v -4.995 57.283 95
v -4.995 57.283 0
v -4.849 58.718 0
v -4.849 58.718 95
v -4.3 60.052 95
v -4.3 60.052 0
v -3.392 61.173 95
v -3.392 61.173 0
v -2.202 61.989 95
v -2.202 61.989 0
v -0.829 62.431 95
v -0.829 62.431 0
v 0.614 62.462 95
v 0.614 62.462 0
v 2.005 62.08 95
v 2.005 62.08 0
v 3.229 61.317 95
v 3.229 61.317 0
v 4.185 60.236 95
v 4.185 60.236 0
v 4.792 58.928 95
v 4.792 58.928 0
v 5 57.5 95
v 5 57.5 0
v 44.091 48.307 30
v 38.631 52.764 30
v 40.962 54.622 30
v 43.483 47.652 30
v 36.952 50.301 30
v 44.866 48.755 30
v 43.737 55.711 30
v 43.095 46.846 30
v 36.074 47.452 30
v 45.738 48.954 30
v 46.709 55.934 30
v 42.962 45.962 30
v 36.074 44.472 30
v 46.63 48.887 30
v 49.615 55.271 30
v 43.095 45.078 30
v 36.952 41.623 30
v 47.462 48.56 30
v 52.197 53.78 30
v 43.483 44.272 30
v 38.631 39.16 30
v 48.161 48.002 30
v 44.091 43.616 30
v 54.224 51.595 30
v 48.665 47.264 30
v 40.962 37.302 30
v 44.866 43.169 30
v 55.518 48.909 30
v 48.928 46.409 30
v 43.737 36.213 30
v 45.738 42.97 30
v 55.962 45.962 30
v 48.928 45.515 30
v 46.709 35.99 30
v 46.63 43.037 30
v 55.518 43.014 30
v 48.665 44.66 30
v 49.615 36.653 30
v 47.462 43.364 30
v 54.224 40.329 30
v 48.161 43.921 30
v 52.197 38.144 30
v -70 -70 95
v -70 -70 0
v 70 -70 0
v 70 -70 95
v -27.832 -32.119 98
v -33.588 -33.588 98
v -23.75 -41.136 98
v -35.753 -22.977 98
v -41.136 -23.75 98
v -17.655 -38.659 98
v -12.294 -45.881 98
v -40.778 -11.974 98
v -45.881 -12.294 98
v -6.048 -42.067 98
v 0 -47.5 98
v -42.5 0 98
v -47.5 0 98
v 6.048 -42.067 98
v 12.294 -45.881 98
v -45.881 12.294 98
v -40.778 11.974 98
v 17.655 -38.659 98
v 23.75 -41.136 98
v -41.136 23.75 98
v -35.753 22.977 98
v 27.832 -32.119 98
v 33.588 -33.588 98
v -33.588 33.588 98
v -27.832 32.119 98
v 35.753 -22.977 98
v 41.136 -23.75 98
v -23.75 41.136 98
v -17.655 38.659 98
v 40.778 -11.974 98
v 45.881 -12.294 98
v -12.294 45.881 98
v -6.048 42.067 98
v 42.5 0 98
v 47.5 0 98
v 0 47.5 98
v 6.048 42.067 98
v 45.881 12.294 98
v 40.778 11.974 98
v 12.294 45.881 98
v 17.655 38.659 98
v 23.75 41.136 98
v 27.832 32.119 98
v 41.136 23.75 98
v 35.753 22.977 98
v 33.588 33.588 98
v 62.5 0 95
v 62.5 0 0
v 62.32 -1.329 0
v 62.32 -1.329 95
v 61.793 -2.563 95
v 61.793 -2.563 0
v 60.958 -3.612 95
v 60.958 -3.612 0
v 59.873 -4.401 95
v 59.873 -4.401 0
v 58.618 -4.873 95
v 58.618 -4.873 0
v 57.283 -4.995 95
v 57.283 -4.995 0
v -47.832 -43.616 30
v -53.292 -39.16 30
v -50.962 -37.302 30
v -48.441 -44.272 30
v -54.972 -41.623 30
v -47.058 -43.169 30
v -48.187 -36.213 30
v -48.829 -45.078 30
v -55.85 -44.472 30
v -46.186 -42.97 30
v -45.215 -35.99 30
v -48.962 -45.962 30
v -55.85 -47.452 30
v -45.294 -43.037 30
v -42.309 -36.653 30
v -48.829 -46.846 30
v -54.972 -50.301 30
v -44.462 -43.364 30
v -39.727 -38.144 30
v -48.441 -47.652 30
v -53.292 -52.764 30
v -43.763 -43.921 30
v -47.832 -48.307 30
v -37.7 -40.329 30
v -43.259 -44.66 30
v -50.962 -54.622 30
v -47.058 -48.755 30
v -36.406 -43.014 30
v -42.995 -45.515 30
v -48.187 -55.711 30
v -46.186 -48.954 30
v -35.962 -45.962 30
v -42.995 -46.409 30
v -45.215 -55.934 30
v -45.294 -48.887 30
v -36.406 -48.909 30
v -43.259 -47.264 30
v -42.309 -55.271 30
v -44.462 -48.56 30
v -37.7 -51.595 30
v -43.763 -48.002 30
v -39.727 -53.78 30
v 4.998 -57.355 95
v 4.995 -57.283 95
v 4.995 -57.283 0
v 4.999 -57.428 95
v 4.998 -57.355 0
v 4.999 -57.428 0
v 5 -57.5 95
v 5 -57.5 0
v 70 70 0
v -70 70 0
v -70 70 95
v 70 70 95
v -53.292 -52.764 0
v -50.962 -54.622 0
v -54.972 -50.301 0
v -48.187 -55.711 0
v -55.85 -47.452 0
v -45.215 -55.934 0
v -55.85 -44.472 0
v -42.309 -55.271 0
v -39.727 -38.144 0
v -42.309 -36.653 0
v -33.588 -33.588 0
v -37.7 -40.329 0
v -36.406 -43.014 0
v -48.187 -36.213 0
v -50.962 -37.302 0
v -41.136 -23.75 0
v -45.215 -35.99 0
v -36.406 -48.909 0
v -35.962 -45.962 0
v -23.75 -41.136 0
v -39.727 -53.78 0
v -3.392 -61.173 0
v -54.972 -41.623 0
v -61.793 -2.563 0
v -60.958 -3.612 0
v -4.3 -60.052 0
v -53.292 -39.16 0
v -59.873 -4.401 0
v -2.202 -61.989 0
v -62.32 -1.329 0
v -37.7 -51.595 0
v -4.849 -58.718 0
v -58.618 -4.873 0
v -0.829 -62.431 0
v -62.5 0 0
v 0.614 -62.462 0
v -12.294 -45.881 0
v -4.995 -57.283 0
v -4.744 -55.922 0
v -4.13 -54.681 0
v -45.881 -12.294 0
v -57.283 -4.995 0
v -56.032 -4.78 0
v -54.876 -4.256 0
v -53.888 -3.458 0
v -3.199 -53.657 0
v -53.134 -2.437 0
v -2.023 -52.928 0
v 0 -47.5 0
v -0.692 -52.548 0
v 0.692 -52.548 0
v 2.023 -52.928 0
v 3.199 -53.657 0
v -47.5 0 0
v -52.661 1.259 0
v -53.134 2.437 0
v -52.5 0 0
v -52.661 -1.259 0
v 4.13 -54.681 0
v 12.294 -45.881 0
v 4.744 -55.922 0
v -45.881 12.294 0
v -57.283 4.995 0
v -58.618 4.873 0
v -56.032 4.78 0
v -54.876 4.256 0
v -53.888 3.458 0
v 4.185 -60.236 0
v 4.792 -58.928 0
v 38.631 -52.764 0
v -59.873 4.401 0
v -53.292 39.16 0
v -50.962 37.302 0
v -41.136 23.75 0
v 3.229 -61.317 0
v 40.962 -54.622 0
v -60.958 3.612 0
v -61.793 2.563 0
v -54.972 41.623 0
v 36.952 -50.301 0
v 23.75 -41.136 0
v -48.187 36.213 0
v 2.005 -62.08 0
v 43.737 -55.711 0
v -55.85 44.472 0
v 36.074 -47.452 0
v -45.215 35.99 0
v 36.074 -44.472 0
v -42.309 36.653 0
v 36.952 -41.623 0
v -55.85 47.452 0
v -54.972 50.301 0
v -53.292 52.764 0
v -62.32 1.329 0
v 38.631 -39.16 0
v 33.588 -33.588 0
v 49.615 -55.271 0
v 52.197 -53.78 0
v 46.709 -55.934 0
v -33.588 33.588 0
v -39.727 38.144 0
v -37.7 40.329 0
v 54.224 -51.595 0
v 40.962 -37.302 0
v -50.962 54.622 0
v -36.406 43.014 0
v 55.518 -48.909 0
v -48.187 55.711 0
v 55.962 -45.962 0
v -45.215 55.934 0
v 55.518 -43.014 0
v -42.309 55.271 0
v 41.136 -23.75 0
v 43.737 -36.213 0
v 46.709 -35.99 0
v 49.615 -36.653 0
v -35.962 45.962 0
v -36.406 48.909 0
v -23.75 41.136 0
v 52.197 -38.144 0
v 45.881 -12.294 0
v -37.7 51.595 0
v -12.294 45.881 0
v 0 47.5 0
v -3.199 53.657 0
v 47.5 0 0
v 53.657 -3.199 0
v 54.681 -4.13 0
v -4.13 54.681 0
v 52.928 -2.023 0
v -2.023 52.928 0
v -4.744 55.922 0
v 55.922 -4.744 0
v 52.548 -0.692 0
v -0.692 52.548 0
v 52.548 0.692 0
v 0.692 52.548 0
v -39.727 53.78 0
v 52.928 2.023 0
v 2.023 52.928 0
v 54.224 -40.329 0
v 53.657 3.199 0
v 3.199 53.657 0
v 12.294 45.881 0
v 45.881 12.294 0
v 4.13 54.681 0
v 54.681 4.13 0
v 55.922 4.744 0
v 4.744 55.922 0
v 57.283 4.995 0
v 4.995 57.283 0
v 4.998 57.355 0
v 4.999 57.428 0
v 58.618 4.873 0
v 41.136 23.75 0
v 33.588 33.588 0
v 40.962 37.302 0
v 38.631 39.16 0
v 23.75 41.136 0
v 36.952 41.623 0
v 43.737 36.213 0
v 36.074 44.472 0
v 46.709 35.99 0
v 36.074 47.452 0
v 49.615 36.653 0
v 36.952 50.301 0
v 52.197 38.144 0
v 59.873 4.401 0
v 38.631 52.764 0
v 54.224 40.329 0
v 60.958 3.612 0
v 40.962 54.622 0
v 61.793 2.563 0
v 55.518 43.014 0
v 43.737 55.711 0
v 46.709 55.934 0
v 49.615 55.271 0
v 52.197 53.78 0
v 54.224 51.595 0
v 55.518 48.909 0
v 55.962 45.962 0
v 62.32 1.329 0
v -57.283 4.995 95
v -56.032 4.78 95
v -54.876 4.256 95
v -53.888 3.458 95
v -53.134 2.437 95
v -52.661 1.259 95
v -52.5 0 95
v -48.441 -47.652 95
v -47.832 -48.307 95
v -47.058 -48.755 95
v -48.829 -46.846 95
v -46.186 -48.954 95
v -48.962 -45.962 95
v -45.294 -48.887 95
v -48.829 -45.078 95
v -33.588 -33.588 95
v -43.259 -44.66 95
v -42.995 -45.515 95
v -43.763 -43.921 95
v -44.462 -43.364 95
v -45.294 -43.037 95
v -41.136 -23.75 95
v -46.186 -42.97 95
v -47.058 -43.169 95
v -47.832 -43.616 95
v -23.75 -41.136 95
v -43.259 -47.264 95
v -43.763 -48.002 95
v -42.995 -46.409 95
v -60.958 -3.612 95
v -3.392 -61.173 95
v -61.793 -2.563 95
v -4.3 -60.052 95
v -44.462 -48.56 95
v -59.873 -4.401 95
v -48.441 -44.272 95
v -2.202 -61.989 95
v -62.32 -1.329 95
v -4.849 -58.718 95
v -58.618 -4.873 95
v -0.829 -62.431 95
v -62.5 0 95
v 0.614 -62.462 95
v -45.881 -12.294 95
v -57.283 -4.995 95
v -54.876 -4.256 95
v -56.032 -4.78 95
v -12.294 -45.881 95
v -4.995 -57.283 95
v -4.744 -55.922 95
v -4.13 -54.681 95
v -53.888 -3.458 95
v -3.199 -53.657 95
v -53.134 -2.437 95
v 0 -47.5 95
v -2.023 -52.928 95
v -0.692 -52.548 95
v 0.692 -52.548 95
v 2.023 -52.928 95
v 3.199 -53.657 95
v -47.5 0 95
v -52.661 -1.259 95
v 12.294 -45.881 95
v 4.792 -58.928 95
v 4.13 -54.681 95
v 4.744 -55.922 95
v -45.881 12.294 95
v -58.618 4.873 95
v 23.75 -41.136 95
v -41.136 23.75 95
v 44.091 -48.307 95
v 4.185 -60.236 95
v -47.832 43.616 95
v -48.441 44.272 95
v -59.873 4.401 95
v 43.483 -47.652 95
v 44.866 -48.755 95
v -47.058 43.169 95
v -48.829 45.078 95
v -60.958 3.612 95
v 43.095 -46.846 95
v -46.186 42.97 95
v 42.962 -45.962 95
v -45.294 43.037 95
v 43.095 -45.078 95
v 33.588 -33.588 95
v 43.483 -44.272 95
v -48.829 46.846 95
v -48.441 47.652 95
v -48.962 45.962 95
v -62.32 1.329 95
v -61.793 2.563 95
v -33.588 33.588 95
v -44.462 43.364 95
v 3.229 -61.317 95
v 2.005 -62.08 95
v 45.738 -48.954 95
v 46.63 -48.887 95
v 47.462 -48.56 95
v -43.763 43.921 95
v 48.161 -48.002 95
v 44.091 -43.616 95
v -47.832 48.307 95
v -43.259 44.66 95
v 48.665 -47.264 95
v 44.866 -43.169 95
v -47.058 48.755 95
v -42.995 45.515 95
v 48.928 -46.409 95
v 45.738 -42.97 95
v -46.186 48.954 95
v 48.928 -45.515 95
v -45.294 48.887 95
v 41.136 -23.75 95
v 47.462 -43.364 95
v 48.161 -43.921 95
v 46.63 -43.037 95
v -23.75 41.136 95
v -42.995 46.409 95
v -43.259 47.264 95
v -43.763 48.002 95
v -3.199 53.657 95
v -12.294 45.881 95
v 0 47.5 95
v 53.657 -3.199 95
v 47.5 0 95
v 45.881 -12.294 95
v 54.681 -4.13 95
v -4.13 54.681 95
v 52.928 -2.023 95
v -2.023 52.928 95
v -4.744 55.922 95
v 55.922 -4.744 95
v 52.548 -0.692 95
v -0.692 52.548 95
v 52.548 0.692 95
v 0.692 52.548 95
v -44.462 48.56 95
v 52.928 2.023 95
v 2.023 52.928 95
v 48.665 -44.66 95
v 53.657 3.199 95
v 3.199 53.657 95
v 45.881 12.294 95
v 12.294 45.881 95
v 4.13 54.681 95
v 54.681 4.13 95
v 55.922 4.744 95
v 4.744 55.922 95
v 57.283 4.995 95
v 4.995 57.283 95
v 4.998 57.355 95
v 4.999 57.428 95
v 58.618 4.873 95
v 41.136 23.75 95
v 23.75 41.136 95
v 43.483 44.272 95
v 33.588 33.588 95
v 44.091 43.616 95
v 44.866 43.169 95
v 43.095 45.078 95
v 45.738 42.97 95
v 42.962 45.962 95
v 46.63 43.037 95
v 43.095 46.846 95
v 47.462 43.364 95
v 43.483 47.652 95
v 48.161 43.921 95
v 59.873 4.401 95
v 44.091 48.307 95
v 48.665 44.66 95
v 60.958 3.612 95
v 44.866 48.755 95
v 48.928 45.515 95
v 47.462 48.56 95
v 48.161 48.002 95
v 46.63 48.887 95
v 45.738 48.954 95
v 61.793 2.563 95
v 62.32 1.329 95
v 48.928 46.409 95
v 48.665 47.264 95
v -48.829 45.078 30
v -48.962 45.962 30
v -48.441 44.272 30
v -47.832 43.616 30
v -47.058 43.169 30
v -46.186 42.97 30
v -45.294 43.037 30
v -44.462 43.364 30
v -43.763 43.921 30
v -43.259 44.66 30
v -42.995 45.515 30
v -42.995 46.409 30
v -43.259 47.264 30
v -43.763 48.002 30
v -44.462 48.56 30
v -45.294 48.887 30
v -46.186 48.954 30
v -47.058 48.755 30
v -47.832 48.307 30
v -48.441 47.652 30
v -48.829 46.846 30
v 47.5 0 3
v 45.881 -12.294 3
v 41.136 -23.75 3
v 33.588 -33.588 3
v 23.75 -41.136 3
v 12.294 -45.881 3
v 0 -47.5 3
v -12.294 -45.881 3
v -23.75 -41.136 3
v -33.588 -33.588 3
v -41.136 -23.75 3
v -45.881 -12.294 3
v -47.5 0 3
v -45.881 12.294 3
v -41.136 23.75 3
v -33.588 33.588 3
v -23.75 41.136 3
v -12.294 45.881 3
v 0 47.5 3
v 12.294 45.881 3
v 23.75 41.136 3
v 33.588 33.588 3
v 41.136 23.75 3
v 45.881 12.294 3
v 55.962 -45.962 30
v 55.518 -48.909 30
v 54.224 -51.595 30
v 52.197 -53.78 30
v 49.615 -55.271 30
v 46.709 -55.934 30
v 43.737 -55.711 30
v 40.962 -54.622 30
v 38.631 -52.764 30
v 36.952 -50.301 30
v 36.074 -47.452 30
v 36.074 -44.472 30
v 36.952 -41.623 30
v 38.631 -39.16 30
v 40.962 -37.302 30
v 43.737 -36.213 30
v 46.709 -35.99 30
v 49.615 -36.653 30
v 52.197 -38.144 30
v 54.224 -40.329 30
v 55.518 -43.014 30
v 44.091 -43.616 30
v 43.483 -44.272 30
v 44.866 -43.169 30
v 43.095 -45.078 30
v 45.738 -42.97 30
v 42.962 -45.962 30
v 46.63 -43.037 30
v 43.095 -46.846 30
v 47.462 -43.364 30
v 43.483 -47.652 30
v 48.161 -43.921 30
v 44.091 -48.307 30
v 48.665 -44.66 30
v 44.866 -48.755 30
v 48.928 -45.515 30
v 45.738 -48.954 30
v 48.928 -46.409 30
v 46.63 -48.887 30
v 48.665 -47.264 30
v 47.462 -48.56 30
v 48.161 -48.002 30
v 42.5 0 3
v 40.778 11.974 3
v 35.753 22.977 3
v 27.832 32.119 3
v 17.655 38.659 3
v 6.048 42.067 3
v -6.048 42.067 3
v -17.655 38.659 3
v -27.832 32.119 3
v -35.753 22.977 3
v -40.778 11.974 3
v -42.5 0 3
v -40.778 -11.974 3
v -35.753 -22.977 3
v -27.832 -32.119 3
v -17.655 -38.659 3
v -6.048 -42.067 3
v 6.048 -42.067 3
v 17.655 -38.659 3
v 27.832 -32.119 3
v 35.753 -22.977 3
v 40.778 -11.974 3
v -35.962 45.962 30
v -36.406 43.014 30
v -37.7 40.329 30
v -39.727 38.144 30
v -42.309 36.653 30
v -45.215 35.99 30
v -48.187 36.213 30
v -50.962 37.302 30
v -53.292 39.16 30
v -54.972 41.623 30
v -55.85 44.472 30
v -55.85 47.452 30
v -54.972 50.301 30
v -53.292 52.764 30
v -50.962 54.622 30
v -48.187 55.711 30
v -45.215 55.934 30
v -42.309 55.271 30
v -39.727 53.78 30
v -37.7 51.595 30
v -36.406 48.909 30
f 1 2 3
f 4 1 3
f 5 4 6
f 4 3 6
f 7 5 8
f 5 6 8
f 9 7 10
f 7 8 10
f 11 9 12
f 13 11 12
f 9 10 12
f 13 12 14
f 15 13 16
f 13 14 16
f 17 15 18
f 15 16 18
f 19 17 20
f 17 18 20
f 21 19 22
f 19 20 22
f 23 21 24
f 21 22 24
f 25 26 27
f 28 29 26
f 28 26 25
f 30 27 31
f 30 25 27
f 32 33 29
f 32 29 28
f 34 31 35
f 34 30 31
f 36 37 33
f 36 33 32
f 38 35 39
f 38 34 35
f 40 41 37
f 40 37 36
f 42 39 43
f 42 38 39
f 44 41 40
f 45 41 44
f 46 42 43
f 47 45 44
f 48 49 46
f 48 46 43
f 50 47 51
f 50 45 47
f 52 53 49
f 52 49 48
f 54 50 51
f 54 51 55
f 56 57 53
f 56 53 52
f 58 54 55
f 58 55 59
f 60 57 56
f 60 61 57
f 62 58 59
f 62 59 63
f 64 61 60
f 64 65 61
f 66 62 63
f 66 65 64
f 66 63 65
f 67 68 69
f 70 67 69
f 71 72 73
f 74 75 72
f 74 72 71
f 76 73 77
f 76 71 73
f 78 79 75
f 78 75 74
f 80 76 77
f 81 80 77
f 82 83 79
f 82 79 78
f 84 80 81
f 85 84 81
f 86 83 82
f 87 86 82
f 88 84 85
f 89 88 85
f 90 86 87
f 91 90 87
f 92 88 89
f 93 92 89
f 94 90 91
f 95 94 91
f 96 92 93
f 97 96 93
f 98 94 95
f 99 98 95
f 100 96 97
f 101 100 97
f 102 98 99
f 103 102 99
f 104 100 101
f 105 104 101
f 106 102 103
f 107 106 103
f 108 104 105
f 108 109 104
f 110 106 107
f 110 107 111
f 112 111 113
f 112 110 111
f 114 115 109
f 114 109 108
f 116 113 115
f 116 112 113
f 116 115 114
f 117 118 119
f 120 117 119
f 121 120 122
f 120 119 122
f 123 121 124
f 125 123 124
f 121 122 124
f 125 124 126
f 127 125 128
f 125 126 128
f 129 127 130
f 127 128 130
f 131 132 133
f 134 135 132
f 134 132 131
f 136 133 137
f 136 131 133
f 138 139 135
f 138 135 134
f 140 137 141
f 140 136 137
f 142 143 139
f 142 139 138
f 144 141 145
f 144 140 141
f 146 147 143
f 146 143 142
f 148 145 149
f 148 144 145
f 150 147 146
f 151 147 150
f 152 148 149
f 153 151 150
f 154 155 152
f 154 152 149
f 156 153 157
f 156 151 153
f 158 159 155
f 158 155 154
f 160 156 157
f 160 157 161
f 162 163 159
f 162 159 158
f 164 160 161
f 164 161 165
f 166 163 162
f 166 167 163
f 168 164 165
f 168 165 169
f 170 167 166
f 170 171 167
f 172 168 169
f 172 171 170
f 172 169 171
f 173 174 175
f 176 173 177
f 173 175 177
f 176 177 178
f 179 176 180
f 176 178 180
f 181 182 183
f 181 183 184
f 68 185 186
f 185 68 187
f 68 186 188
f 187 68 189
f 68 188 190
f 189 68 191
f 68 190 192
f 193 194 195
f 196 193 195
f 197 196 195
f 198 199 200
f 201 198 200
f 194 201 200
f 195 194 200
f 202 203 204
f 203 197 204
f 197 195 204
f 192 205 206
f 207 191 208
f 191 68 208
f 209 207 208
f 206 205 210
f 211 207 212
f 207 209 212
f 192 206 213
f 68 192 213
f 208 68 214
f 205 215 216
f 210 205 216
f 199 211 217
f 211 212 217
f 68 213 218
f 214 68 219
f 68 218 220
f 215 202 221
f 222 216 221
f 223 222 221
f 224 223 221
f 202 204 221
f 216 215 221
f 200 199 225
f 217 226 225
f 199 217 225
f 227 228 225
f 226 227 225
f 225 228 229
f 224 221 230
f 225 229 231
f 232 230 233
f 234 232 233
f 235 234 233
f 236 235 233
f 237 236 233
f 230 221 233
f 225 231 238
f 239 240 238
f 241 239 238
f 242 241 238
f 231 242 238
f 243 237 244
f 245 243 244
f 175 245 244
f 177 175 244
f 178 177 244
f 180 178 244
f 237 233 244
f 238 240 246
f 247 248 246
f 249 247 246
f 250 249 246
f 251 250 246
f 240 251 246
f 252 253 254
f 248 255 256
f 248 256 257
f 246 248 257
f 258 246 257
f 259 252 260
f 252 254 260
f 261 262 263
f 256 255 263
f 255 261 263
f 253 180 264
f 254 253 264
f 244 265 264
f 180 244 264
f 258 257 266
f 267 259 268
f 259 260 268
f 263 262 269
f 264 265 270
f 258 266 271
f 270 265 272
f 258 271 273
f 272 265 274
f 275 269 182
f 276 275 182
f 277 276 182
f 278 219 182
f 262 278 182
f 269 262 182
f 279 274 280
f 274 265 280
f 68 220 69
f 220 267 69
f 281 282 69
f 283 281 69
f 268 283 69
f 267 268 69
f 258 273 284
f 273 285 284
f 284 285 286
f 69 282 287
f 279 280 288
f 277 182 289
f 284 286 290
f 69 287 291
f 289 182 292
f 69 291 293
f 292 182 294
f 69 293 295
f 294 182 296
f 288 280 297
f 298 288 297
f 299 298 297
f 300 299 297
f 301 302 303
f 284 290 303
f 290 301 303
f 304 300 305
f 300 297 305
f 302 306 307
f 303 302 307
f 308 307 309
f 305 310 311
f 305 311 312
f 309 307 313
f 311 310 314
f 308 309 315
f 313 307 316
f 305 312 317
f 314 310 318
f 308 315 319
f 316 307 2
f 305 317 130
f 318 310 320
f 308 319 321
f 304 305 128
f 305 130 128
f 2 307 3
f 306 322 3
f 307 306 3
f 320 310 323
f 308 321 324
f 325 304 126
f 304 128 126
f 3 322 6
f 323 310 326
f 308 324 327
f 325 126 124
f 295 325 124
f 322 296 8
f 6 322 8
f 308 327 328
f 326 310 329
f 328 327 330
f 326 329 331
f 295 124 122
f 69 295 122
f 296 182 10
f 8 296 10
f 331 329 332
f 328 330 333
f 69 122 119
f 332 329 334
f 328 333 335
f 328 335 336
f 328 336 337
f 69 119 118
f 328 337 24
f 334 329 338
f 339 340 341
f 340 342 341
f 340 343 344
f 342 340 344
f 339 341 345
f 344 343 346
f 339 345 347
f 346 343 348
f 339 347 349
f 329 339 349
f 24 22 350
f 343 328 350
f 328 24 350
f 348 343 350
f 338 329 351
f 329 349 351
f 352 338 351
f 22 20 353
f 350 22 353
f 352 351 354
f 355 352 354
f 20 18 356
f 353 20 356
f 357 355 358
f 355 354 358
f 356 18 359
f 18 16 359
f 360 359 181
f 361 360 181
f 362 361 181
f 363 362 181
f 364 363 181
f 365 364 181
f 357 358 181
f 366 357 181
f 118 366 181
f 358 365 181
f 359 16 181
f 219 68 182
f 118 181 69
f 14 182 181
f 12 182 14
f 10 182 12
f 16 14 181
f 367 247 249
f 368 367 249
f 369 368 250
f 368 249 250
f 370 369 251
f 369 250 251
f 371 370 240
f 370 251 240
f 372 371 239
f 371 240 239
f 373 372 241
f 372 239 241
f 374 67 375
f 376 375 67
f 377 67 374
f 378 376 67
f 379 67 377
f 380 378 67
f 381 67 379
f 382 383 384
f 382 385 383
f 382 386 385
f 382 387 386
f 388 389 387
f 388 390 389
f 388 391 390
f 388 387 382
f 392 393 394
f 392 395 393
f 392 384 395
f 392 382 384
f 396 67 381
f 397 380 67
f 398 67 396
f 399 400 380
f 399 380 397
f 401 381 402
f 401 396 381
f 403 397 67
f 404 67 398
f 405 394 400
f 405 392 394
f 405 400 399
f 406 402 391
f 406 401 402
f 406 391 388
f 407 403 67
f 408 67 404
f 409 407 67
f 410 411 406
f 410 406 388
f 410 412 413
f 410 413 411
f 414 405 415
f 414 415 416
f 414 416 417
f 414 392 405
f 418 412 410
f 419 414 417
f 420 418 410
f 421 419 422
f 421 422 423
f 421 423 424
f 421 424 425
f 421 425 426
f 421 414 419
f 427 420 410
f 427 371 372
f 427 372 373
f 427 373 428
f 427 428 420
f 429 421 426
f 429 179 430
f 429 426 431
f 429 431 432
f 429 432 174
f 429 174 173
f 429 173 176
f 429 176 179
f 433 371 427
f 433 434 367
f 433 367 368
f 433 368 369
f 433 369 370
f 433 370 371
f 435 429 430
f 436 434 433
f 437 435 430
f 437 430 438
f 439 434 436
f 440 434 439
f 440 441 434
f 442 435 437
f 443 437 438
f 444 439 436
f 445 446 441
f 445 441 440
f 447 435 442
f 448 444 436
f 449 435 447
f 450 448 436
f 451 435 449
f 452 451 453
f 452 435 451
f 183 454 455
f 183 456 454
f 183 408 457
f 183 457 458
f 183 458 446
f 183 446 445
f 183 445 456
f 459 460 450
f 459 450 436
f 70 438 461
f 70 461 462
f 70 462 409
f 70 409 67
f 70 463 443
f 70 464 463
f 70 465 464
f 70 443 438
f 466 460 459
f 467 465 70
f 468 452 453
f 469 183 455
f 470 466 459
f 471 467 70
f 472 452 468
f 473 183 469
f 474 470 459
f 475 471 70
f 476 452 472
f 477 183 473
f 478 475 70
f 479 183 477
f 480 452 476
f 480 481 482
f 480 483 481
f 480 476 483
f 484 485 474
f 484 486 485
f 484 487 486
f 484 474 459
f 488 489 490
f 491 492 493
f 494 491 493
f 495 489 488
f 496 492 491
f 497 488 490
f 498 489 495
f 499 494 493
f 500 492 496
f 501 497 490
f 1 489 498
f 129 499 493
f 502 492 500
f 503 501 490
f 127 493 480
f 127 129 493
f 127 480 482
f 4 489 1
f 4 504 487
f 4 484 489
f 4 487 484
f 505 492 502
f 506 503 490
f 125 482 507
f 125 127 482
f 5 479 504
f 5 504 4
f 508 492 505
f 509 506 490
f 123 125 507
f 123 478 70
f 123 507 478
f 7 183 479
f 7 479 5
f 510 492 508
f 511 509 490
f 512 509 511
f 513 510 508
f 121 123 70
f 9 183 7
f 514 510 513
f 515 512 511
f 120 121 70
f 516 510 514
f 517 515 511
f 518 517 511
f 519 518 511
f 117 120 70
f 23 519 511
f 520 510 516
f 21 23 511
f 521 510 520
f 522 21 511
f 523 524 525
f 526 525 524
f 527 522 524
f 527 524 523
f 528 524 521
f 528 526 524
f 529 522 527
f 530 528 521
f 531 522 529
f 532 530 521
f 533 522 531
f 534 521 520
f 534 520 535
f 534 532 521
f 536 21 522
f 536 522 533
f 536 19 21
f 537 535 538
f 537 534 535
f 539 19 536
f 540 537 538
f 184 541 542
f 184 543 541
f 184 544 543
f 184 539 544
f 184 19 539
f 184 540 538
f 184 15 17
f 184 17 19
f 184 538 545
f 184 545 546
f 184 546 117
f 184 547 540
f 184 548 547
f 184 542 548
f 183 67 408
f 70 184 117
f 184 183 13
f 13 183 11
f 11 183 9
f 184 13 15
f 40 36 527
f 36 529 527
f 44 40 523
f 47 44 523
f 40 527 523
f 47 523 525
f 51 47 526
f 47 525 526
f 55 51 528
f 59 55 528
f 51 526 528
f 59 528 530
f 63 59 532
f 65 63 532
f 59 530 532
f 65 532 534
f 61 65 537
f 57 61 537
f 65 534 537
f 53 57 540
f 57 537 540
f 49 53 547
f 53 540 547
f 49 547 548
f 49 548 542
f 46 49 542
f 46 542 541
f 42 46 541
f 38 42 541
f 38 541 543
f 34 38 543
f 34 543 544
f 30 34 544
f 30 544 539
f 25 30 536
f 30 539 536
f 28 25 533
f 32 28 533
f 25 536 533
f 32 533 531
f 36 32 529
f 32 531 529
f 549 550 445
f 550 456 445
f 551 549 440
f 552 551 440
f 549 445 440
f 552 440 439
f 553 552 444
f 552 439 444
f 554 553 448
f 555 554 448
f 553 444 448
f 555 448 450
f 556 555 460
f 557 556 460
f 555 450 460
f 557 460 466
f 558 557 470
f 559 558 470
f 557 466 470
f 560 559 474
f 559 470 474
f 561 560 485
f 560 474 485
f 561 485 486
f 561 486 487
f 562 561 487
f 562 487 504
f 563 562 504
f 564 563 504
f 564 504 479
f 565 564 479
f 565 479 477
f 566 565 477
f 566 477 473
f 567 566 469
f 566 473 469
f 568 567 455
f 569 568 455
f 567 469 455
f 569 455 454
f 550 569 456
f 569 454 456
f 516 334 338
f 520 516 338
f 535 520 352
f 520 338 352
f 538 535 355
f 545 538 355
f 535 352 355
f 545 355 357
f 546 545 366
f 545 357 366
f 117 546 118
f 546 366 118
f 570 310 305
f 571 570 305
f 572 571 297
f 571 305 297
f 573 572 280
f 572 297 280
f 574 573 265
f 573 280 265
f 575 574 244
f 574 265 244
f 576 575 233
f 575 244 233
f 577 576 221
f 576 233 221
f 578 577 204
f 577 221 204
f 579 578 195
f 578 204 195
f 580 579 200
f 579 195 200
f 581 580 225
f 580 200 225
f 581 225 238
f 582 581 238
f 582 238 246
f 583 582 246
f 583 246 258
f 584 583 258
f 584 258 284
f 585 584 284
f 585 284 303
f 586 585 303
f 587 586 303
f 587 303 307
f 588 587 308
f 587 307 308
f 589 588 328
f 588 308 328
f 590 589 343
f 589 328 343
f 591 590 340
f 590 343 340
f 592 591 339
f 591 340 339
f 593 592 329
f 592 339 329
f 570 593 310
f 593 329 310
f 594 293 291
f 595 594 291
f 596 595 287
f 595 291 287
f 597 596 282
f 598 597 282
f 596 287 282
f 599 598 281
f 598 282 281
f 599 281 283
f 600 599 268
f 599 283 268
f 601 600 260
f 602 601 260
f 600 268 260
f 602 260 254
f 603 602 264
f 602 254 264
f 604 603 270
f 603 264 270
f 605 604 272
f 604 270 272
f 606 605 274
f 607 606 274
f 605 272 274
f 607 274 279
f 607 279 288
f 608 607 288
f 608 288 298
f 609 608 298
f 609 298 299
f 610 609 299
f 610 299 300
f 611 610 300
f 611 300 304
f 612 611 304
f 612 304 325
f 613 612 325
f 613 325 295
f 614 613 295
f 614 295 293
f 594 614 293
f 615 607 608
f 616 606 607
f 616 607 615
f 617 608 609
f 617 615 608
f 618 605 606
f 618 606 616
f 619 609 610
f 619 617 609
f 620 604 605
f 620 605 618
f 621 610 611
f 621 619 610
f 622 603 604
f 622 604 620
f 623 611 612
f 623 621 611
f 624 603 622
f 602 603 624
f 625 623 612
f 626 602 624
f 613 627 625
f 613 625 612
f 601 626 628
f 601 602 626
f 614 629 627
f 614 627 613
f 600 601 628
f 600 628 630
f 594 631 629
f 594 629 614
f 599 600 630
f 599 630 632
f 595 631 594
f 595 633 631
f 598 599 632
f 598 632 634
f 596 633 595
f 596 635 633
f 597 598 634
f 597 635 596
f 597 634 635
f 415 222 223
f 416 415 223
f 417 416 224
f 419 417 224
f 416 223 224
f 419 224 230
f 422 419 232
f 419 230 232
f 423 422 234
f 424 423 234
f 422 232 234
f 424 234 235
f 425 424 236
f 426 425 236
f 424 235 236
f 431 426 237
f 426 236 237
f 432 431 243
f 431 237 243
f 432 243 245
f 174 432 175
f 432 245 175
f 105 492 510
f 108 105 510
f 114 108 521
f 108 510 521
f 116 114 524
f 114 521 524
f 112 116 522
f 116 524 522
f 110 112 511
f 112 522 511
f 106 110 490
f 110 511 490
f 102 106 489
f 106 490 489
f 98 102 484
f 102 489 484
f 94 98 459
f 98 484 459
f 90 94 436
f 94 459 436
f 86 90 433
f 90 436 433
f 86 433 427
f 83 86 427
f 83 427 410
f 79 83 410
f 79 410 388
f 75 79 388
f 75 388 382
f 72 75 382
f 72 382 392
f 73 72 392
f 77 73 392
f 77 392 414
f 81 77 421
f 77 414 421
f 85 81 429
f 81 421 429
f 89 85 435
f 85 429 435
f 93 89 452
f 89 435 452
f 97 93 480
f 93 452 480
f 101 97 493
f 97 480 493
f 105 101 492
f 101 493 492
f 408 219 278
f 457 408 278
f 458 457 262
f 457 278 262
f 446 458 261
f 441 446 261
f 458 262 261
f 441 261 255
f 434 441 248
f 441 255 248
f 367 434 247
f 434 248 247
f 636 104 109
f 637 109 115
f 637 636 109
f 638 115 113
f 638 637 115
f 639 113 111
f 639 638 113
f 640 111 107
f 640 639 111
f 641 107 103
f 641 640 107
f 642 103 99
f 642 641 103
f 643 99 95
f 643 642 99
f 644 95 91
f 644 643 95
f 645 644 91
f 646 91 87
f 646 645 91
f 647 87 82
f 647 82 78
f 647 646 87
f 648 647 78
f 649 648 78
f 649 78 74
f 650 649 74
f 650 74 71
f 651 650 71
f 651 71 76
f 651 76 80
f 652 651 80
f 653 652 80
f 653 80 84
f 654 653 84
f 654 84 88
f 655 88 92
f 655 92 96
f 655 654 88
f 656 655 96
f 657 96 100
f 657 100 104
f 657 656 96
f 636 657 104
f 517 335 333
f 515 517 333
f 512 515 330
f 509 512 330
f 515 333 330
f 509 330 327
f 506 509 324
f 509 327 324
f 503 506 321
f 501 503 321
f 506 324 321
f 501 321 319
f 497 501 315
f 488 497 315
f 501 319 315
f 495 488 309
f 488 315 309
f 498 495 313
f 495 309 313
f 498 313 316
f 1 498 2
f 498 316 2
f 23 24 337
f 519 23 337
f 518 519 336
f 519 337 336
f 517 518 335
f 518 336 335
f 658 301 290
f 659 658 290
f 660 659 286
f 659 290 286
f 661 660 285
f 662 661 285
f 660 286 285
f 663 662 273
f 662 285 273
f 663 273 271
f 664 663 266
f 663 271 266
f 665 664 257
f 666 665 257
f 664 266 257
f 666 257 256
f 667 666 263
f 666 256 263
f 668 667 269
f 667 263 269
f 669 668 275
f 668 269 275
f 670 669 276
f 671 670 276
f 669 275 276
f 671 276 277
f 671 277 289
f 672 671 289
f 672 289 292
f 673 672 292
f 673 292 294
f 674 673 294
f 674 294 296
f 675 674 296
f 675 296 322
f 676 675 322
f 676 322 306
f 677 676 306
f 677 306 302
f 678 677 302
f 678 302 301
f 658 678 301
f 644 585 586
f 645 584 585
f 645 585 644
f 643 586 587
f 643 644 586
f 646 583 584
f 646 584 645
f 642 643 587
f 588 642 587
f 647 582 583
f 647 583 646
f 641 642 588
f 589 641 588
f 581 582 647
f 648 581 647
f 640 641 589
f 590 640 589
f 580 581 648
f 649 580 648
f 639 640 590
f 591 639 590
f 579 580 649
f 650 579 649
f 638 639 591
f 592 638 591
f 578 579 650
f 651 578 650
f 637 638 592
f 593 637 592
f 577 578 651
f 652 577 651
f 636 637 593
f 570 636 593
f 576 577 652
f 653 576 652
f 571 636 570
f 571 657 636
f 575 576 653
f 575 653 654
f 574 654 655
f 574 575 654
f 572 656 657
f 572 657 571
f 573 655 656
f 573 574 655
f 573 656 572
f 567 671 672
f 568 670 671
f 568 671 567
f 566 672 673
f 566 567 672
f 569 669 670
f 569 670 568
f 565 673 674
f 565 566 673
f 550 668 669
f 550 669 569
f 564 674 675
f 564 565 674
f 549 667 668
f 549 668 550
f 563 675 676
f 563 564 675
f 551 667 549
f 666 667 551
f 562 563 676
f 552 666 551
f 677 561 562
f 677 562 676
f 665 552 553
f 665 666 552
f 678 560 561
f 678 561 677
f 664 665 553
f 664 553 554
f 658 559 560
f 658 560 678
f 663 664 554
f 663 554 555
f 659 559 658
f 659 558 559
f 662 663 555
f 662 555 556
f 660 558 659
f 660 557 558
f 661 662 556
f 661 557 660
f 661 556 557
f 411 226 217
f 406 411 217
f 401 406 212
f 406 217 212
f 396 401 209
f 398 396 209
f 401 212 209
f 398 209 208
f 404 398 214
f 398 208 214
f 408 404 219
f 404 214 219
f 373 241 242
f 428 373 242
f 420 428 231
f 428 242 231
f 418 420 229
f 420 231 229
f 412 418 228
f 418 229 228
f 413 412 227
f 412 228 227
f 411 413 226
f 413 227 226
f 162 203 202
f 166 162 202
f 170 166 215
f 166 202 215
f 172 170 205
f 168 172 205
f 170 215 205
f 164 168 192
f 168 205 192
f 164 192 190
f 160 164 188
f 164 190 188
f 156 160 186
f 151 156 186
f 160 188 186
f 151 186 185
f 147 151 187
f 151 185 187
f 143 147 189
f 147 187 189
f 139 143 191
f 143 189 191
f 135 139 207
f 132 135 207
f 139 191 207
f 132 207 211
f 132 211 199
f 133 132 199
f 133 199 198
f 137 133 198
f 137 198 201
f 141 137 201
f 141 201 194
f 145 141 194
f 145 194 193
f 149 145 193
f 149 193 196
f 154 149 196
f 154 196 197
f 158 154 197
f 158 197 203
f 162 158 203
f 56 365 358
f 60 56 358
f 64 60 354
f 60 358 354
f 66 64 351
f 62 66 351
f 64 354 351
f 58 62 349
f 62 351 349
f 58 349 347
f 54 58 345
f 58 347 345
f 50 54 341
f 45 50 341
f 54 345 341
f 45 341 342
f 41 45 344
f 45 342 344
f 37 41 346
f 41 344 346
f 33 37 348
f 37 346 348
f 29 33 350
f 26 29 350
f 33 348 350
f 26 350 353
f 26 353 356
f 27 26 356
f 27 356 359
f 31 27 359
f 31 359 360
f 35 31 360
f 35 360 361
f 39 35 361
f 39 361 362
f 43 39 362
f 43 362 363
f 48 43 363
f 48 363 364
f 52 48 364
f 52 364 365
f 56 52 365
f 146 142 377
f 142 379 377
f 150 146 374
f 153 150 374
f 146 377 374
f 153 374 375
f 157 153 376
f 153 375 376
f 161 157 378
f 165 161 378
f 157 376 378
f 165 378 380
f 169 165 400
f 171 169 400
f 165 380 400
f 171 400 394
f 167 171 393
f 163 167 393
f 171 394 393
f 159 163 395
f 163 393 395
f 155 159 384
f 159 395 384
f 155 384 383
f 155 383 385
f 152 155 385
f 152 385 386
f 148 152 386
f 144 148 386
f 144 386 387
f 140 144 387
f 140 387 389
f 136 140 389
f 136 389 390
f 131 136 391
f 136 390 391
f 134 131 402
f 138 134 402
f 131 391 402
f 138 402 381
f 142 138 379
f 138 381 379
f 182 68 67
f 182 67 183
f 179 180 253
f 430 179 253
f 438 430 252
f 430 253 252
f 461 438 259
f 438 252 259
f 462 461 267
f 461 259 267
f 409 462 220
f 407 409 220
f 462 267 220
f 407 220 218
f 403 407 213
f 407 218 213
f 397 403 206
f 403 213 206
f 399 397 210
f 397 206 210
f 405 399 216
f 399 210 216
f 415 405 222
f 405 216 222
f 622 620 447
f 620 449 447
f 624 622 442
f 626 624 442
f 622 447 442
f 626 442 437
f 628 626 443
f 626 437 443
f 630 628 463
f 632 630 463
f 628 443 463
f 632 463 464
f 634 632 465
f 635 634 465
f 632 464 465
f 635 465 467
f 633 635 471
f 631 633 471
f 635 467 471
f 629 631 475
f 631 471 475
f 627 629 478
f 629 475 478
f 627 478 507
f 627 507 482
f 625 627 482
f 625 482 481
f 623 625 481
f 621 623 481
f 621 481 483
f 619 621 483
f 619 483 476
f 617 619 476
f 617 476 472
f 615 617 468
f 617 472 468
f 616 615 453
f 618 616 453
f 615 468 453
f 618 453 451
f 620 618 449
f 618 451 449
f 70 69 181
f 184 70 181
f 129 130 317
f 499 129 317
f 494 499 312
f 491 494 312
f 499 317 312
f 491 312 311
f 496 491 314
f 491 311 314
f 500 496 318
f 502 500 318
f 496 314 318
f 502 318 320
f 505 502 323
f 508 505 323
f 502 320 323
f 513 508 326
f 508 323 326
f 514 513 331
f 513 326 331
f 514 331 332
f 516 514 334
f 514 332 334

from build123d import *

# Parameters (mm, degrees)
F0_W           = 140
F0_H           = 140
F0_R           = 42.5
F1_DEPTH       = 95
F2_R           = 47.5
F2_R_2         = 42.5
F3_DEPTH       = 3
F4_R           = 47.5
F4_R_2         = 42.5
F5_DEPTH       = 3
F8_DEPTH       = 98.001
F9_D           = 6
F9_CBORE_D     = 20
F9_CBORE_DEPTH = 30


with BuildPart() as f1:
    # F0 (on Top) → F1 (new body)
    with BuildSketch(Plane.XY):
        Rectangle(F0_W, F0_H)
        Circle(F0_R, mode=Mode.SUBTRACT)
    extrude(amount=F1_DEPTH)

    # F2 (on face) → F3 (join)
    with BuildSketch(Plane.XY.offset(95)):
        Circle(F2_R)
        Circle(F2_R_2, mode=Mode.SUBTRACT)
    extrude(amount=F3_DEPTH)

    # F4 (on face) → F5 (cut)
    with BuildSketch(Plane(origin=(0, 0, 0), x_dir=(1, 0, 0), z_dir=(0, 0, -1))):
        Circle(F4_R)
        Circle(F4_R_2, mode=Mode.SUBTRACT)
    extrude(amount=-F5_DEPTH, mode=Mode.SUBTRACT)

    # F7 (on face) → F8 (cut, through all)
    with BuildSketch(Plane(origin=(0, 0, 0), x_dir=(1, 0, 0), z_dir=(0, 0, -1))):
        with BuildLine():
            ThreePointArc((-62.5, 0), (-60.957820374, -3.6115755926), (-57.2826086957, -4.9952718666))
            ThreePointArc((-57.2826086957, -4.9952718666), (-57.4456264654, -2.5), (-57.5, 0))
            Line((-57.5, 0), (-62.5, 0))
        make_face()
        with BuildLine():
            ThreePointArc((-57.5, 0), (-57.4456264654, -2.5), (-57.2826086957, -4.9952718666))
            ThreePointArc((-57.2826086957, -4.9952718666), (-53.8884244074, -3.457820374), (-52.5, 0))
            Line((-52.5, 0), (-57.5, 0))
        make_face()
        with BuildLine():
            ThreePointArc((-52.5, 0), (-53.8884244074, 3.457820374), (-57.2826086957, 4.9952718666))
            ThreePointArc((-57.2826086957, 4.9952718666), (-57.4456264654, 2.5), (-57.5, 0))
            Line((-57.5, 0), (-52.5, 0))
        make_face()
        with BuildLine():
            ThreePointArc((-57.5, 0), (-57.4456264654, 2.5), (-57.2826086957, 4.9952718666))
            ThreePointArc((-57.2826086957, 4.9952718666), (-60.957820374, 3.6115755926), (-62.5, 0))
            Line((-62.5, 0), (-57.5, 0))
        make_face()
        with BuildLine():
            ThreePointArc((-4.9952718666, -57.2826086957), (0, -57.5), (4.9952718666, -57.2826086957))
            ThreePointArc((4.9952718666, -57.2826086957), (0, -52.5), (-4.9952718666, -57.2826086957))
        make_face()
        with BuildLine():
            ThreePointArc((5, -57.5), (4.9988178269, -57.3912786423), (4.9952718666, -57.2826086957))
            ThreePointArc((4.9952718666, -57.2826086957), (0, -57.5), (-4.9952718666, -57.2826086957))
            ThreePointArc((-4.9952718666, -57.2826086957), (-0.1087213577, -62.4988178269), (5, -57.5))
        make_face()
        with BuildLine():
            ThreePointArc((57.2826086957, 4.9952718666), (57.4456264654, 2.5), (57.5, 0))
            ThreePointArc((57.5, 0), (57.4456264654, -2.5), (57.2826086957, -4.9952718666))
            ThreePointArc((57.2826086957, -4.9952718666), (60.957820374, -3.6115755926), (62.5, 0))
            ThreePointArc((62.5, 0), (60.957820374, 3.6115755926), (57.2826086957, 4.9952718666))
        make_face()
        with BuildLine():
            ThreePointArc((57.2826086957, -4.9952718666), (57.4456264654, -2.5), (57.5, 0))
            ThreePointArc((57.5, 0), (57.4456264654, 2.5), (57.2826086957, 4.9952718666))
            ThreePointArc((57.2826086957, 4.9952718666), (52.5, 0), (57.2826086957, -4.9952718666))
        make_face()
        with BuildLine():
            ThreePointArc((-4.9952718666, 57.2826086957), (0, 52.5), (4.9952718666, 57.2826086957))
            ThreePointArc((4.9952718666, 57.2826086957), (0, 57.5), (-4.9952718666, 57.2826086957))
        make_face()
        with BuildLine():
            ThreePointArc((-4.9952718666, 57.2826086957), (0, 57.5), (4.9952718666, 57.2826086957))
            ThreePointArc((4.9952718666, 57.2826086957), (4.9988178269, 57.3912786423), (5, 57.5))
            ThreePointArc((5, 57.5), (-0.1087213577, 62.4988178269), (-4.9952718666, 57.2826086957))
        make_face()
    extrude(amount=-F8_DEPTH, mode=Mode.SUBTRACT)

    # F9 (through all)
    with Locations(Plane(origin=(0, 0, 0), x_dir=(1, 0, 0), z_dir=(0, 0, -1))):
        with Locations((-45.9619407771, -45.9619407771), (-45.9619407771, 45.9619407771), (45.9619407771, -45.9619407771), (45.9619407771, 45.9619407771)):
            CounterBoreHole(F9_D / 2, F9_CBORE_D / 2, F9_CBORE_DEPTH)


solid = f1.part
